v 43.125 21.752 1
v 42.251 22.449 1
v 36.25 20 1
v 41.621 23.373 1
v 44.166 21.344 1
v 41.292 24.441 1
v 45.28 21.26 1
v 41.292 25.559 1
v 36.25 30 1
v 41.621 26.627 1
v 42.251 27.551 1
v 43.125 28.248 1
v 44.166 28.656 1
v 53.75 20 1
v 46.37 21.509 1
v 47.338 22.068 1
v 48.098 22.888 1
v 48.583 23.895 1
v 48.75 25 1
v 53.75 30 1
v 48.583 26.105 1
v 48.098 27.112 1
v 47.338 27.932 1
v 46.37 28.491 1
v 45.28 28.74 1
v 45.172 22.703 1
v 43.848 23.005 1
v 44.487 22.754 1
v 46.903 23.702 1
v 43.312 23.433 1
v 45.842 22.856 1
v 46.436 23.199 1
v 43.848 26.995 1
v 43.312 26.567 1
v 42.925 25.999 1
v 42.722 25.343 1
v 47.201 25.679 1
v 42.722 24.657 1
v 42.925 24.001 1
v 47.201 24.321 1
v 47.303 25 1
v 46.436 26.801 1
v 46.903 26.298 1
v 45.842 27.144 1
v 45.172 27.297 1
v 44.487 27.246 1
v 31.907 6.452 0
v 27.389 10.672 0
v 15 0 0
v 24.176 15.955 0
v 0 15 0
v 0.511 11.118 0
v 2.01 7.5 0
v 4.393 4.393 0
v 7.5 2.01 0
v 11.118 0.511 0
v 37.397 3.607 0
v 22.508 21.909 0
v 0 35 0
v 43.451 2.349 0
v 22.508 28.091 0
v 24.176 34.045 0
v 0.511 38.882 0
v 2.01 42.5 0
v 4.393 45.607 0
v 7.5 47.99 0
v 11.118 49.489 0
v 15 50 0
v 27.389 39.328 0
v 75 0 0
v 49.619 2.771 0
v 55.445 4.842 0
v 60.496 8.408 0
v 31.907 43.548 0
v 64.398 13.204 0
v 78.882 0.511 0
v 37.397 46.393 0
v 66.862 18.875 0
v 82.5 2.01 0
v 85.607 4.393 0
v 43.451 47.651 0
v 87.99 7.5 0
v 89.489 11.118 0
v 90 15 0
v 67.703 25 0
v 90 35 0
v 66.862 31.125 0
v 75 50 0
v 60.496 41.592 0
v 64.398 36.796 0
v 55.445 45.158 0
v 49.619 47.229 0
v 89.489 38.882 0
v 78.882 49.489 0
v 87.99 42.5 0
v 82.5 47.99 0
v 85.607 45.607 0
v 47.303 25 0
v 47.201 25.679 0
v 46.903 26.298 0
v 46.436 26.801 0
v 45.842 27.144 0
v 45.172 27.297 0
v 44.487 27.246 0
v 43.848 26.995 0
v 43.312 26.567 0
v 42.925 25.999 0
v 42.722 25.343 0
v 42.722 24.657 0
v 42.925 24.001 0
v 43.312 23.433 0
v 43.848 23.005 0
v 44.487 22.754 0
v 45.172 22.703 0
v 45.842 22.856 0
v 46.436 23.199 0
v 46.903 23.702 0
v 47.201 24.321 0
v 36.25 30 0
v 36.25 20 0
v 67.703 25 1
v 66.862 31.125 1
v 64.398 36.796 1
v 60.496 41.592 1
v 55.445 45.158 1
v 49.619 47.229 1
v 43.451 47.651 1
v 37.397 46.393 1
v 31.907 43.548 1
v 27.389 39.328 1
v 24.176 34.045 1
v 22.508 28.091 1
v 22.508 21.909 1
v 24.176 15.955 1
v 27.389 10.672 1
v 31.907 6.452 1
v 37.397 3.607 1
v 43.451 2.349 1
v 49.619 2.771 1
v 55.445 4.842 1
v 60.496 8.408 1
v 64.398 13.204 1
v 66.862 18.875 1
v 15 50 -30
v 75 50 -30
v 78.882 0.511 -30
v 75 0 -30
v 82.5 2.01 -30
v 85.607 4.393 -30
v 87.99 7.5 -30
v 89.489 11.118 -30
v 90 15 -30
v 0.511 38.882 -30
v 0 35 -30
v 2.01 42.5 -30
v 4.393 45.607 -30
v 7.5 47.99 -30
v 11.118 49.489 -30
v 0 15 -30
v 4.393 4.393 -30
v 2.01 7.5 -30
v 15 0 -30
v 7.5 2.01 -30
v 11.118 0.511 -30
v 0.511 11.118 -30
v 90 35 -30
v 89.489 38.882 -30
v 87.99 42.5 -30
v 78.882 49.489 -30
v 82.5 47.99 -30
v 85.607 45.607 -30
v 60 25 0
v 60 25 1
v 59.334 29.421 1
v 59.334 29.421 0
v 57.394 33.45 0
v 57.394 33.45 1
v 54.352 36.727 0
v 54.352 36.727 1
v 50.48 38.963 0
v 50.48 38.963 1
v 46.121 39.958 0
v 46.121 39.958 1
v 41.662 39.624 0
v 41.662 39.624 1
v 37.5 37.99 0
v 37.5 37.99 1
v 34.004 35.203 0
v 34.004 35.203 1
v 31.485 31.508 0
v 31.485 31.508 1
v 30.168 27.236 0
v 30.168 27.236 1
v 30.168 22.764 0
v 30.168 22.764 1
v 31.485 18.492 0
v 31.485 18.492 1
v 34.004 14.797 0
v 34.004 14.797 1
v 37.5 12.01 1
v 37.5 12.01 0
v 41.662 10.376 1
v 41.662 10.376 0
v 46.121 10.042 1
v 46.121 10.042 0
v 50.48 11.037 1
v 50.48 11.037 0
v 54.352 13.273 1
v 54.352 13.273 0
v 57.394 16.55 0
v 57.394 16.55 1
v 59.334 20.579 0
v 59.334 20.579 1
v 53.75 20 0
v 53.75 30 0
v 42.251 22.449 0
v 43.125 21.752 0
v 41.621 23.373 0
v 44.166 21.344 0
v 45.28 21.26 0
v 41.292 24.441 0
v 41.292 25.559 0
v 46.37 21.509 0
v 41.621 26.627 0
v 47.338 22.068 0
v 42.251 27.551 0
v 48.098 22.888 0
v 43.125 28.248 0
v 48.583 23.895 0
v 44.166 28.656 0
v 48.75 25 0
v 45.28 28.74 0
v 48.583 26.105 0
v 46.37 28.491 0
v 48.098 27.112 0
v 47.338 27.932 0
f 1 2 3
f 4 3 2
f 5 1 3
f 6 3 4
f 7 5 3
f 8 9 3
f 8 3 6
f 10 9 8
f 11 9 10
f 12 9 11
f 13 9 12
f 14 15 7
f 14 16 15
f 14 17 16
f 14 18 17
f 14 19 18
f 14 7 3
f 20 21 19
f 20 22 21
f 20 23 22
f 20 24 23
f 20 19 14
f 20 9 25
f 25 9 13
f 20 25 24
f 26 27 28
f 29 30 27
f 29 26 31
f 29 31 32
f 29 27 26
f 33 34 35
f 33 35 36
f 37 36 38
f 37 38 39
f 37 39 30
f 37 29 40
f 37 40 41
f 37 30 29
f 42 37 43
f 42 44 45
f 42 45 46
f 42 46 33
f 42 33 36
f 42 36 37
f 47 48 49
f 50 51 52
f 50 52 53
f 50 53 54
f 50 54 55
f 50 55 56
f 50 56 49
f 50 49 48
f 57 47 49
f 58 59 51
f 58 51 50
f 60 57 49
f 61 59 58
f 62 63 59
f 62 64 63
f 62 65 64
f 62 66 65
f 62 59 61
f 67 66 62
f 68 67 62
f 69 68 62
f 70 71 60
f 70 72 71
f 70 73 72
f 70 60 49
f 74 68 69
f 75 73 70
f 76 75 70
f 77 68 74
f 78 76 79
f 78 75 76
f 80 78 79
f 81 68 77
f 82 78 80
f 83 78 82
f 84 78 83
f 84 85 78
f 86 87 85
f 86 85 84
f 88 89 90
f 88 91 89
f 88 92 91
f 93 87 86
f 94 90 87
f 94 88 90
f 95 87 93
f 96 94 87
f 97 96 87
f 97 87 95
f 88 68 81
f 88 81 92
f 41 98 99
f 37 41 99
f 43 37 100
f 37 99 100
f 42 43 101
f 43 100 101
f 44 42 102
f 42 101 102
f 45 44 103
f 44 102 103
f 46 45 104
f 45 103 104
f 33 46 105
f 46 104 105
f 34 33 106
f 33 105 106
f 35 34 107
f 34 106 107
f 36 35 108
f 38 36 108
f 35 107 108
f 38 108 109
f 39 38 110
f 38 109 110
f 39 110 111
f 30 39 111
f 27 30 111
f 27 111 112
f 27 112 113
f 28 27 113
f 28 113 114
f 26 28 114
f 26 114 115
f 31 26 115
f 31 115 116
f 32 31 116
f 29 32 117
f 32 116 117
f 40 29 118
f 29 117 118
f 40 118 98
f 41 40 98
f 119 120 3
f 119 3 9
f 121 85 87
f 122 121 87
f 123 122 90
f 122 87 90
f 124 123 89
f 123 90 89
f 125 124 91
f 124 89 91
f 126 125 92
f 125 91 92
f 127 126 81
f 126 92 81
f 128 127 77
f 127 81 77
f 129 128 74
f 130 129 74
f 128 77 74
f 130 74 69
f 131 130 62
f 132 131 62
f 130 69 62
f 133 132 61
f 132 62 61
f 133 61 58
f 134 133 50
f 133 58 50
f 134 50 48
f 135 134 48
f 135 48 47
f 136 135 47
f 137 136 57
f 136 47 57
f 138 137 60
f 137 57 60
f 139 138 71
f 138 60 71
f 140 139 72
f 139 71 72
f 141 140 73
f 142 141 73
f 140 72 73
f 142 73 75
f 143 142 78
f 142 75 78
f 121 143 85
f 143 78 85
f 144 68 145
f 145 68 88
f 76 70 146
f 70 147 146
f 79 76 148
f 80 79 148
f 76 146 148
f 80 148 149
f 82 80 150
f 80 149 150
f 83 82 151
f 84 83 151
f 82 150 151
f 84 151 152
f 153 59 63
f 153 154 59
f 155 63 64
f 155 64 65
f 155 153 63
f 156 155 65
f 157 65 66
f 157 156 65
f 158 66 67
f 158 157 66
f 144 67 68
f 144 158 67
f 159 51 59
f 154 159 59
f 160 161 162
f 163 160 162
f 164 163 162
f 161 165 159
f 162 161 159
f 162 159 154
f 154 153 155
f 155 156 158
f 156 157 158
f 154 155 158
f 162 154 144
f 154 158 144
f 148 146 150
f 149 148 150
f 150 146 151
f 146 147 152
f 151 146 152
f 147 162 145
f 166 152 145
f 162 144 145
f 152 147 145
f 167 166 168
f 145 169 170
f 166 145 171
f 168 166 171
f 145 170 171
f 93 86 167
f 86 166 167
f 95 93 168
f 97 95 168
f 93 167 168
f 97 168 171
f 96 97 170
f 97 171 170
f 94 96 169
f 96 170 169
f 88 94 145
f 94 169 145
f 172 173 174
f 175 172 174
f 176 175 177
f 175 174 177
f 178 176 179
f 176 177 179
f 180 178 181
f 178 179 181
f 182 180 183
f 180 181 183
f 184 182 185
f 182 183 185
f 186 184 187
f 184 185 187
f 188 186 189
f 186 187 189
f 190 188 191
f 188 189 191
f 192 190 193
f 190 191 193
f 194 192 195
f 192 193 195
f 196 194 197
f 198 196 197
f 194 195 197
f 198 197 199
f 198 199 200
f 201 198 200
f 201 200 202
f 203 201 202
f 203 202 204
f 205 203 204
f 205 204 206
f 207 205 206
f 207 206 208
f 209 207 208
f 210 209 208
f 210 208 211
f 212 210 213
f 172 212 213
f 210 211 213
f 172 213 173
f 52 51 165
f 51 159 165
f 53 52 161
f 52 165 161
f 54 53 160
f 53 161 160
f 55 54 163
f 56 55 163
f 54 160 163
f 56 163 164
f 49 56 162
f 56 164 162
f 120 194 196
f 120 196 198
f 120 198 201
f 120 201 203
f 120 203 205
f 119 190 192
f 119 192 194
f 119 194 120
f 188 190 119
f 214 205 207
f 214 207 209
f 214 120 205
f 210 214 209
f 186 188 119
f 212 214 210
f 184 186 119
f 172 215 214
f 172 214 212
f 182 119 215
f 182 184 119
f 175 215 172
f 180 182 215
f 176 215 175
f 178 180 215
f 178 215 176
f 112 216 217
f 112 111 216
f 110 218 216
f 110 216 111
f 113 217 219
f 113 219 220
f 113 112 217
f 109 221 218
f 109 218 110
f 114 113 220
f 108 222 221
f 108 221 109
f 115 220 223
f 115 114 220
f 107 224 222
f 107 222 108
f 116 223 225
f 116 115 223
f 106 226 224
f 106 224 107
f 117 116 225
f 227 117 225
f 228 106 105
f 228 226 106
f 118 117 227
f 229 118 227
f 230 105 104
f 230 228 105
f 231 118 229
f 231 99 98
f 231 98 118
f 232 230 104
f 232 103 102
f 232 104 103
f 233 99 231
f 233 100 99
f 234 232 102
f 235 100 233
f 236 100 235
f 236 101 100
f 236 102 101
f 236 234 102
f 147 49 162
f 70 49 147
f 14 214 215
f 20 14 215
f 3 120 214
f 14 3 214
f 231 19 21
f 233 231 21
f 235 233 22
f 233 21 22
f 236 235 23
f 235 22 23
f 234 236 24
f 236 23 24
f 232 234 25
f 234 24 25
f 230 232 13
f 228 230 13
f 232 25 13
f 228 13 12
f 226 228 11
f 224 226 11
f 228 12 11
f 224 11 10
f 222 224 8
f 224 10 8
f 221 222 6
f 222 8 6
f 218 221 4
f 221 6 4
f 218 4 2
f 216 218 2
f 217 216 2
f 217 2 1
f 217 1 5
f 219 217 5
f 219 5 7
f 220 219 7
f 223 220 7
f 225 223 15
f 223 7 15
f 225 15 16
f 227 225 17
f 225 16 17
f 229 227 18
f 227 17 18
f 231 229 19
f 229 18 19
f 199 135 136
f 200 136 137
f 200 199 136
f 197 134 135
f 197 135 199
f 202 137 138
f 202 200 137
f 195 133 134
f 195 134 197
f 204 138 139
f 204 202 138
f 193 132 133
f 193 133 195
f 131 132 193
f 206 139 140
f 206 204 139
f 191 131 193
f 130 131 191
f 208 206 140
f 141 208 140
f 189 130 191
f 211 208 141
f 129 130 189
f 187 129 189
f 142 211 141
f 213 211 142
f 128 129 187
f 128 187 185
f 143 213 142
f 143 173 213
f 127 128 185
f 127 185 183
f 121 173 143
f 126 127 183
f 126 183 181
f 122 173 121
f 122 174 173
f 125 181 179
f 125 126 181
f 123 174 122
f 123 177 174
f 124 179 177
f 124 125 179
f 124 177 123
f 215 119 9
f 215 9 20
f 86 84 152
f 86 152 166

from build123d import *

# Parameters (mm, degrees)
SKETCH1_W           = 90
SKETCH1_H           = 50
BOSS_EXTRUDE1_DEPTH = 30
FILLET1_R           = 15
SKETCH2_R           = 22.703438641
BOSS_EXTRUDE2_DEPTH = 1
SKETCH3_R           = 15
CUT_EXTRUDE1_DEPTH  = 1
SKETCH4_W           = 17.5
SKETCH4_H           = 10
BOSS_EXTRUDE3_DEPTH = 1
SKETCH5_R           = 3.75
CUT_EXTRUDE2_DEPTH  = 1
SKETCH6_R           = 2.30333071
BOSS_EXTRUDE4_DEPTH = 1


with BuildPart() as part:
    # Sketch1 → Boss-Extrude1 (new body)
    with BuildSketch(Plane.XY):
        with Locations((45, 25)):
            Rectangle(SKETCH1_W, SKETCH1_H)
    extrude(amount=-BOSS_EXTRUDE1_DEPTH)

    # Fillet1
    fillet1_edges = [part.edges().sort_by_distance(p)[0] for p in [
        (0, 50, -15),
        (90, 50, -15),
        (90, 0, -15),
        (0, 0, -15),
    ]]
    fillet(fillet1_edges, radius=FILLET1_R)

    # Sketch2 → Boss-Extrude2 (add)
    with BuildSketch(Plane.XY):
        with Locations((45, 25)):
            Circle(SKETCH2_R)
    extrude(amount=BOSS_EXTRUDE2_DEPTH)

    # Sketch3 → Cut-Extrude1 (cut)
    with BuildSketch(Plane.XY.offset(1)):
        with Locations((45, 25)):
            Circle(SKETCH3_R)
    extrude(amount=-CUT_EXTRUDE1_DEPTH, mode=Mode.SUBTRACT)

    # Sketch4 → Boss-Extrude3 (add)
    with BuildSketch(Plane.XY):
        with Locations((45, 25)):
            Rectangle(SKETCH4_W, SKETCH4_H)
    extrude(amount=BOSS_EXTRUDE3_DEPTH)

    # Sketch5 → Cut-Extrude2 (cut)
    with BuildSketch(Plane.XY.offset(1)):
        with Locations((45, 25)):
            Circle(SKETCH5_R)
    extrude(amount=-CUT_EXTRUDE2_DEPTH, mode=Mode.SUBTRACT)

    # Sketch6 → Boss-Extrude4 (add)
    with BuildSketch(Plane.XY):
        with Locations((45, 25)):
            Circle(SKETCH6_R)
    extrude(amount=BOSS_EXTRUDE4_DEPTH)


solid = part.part
